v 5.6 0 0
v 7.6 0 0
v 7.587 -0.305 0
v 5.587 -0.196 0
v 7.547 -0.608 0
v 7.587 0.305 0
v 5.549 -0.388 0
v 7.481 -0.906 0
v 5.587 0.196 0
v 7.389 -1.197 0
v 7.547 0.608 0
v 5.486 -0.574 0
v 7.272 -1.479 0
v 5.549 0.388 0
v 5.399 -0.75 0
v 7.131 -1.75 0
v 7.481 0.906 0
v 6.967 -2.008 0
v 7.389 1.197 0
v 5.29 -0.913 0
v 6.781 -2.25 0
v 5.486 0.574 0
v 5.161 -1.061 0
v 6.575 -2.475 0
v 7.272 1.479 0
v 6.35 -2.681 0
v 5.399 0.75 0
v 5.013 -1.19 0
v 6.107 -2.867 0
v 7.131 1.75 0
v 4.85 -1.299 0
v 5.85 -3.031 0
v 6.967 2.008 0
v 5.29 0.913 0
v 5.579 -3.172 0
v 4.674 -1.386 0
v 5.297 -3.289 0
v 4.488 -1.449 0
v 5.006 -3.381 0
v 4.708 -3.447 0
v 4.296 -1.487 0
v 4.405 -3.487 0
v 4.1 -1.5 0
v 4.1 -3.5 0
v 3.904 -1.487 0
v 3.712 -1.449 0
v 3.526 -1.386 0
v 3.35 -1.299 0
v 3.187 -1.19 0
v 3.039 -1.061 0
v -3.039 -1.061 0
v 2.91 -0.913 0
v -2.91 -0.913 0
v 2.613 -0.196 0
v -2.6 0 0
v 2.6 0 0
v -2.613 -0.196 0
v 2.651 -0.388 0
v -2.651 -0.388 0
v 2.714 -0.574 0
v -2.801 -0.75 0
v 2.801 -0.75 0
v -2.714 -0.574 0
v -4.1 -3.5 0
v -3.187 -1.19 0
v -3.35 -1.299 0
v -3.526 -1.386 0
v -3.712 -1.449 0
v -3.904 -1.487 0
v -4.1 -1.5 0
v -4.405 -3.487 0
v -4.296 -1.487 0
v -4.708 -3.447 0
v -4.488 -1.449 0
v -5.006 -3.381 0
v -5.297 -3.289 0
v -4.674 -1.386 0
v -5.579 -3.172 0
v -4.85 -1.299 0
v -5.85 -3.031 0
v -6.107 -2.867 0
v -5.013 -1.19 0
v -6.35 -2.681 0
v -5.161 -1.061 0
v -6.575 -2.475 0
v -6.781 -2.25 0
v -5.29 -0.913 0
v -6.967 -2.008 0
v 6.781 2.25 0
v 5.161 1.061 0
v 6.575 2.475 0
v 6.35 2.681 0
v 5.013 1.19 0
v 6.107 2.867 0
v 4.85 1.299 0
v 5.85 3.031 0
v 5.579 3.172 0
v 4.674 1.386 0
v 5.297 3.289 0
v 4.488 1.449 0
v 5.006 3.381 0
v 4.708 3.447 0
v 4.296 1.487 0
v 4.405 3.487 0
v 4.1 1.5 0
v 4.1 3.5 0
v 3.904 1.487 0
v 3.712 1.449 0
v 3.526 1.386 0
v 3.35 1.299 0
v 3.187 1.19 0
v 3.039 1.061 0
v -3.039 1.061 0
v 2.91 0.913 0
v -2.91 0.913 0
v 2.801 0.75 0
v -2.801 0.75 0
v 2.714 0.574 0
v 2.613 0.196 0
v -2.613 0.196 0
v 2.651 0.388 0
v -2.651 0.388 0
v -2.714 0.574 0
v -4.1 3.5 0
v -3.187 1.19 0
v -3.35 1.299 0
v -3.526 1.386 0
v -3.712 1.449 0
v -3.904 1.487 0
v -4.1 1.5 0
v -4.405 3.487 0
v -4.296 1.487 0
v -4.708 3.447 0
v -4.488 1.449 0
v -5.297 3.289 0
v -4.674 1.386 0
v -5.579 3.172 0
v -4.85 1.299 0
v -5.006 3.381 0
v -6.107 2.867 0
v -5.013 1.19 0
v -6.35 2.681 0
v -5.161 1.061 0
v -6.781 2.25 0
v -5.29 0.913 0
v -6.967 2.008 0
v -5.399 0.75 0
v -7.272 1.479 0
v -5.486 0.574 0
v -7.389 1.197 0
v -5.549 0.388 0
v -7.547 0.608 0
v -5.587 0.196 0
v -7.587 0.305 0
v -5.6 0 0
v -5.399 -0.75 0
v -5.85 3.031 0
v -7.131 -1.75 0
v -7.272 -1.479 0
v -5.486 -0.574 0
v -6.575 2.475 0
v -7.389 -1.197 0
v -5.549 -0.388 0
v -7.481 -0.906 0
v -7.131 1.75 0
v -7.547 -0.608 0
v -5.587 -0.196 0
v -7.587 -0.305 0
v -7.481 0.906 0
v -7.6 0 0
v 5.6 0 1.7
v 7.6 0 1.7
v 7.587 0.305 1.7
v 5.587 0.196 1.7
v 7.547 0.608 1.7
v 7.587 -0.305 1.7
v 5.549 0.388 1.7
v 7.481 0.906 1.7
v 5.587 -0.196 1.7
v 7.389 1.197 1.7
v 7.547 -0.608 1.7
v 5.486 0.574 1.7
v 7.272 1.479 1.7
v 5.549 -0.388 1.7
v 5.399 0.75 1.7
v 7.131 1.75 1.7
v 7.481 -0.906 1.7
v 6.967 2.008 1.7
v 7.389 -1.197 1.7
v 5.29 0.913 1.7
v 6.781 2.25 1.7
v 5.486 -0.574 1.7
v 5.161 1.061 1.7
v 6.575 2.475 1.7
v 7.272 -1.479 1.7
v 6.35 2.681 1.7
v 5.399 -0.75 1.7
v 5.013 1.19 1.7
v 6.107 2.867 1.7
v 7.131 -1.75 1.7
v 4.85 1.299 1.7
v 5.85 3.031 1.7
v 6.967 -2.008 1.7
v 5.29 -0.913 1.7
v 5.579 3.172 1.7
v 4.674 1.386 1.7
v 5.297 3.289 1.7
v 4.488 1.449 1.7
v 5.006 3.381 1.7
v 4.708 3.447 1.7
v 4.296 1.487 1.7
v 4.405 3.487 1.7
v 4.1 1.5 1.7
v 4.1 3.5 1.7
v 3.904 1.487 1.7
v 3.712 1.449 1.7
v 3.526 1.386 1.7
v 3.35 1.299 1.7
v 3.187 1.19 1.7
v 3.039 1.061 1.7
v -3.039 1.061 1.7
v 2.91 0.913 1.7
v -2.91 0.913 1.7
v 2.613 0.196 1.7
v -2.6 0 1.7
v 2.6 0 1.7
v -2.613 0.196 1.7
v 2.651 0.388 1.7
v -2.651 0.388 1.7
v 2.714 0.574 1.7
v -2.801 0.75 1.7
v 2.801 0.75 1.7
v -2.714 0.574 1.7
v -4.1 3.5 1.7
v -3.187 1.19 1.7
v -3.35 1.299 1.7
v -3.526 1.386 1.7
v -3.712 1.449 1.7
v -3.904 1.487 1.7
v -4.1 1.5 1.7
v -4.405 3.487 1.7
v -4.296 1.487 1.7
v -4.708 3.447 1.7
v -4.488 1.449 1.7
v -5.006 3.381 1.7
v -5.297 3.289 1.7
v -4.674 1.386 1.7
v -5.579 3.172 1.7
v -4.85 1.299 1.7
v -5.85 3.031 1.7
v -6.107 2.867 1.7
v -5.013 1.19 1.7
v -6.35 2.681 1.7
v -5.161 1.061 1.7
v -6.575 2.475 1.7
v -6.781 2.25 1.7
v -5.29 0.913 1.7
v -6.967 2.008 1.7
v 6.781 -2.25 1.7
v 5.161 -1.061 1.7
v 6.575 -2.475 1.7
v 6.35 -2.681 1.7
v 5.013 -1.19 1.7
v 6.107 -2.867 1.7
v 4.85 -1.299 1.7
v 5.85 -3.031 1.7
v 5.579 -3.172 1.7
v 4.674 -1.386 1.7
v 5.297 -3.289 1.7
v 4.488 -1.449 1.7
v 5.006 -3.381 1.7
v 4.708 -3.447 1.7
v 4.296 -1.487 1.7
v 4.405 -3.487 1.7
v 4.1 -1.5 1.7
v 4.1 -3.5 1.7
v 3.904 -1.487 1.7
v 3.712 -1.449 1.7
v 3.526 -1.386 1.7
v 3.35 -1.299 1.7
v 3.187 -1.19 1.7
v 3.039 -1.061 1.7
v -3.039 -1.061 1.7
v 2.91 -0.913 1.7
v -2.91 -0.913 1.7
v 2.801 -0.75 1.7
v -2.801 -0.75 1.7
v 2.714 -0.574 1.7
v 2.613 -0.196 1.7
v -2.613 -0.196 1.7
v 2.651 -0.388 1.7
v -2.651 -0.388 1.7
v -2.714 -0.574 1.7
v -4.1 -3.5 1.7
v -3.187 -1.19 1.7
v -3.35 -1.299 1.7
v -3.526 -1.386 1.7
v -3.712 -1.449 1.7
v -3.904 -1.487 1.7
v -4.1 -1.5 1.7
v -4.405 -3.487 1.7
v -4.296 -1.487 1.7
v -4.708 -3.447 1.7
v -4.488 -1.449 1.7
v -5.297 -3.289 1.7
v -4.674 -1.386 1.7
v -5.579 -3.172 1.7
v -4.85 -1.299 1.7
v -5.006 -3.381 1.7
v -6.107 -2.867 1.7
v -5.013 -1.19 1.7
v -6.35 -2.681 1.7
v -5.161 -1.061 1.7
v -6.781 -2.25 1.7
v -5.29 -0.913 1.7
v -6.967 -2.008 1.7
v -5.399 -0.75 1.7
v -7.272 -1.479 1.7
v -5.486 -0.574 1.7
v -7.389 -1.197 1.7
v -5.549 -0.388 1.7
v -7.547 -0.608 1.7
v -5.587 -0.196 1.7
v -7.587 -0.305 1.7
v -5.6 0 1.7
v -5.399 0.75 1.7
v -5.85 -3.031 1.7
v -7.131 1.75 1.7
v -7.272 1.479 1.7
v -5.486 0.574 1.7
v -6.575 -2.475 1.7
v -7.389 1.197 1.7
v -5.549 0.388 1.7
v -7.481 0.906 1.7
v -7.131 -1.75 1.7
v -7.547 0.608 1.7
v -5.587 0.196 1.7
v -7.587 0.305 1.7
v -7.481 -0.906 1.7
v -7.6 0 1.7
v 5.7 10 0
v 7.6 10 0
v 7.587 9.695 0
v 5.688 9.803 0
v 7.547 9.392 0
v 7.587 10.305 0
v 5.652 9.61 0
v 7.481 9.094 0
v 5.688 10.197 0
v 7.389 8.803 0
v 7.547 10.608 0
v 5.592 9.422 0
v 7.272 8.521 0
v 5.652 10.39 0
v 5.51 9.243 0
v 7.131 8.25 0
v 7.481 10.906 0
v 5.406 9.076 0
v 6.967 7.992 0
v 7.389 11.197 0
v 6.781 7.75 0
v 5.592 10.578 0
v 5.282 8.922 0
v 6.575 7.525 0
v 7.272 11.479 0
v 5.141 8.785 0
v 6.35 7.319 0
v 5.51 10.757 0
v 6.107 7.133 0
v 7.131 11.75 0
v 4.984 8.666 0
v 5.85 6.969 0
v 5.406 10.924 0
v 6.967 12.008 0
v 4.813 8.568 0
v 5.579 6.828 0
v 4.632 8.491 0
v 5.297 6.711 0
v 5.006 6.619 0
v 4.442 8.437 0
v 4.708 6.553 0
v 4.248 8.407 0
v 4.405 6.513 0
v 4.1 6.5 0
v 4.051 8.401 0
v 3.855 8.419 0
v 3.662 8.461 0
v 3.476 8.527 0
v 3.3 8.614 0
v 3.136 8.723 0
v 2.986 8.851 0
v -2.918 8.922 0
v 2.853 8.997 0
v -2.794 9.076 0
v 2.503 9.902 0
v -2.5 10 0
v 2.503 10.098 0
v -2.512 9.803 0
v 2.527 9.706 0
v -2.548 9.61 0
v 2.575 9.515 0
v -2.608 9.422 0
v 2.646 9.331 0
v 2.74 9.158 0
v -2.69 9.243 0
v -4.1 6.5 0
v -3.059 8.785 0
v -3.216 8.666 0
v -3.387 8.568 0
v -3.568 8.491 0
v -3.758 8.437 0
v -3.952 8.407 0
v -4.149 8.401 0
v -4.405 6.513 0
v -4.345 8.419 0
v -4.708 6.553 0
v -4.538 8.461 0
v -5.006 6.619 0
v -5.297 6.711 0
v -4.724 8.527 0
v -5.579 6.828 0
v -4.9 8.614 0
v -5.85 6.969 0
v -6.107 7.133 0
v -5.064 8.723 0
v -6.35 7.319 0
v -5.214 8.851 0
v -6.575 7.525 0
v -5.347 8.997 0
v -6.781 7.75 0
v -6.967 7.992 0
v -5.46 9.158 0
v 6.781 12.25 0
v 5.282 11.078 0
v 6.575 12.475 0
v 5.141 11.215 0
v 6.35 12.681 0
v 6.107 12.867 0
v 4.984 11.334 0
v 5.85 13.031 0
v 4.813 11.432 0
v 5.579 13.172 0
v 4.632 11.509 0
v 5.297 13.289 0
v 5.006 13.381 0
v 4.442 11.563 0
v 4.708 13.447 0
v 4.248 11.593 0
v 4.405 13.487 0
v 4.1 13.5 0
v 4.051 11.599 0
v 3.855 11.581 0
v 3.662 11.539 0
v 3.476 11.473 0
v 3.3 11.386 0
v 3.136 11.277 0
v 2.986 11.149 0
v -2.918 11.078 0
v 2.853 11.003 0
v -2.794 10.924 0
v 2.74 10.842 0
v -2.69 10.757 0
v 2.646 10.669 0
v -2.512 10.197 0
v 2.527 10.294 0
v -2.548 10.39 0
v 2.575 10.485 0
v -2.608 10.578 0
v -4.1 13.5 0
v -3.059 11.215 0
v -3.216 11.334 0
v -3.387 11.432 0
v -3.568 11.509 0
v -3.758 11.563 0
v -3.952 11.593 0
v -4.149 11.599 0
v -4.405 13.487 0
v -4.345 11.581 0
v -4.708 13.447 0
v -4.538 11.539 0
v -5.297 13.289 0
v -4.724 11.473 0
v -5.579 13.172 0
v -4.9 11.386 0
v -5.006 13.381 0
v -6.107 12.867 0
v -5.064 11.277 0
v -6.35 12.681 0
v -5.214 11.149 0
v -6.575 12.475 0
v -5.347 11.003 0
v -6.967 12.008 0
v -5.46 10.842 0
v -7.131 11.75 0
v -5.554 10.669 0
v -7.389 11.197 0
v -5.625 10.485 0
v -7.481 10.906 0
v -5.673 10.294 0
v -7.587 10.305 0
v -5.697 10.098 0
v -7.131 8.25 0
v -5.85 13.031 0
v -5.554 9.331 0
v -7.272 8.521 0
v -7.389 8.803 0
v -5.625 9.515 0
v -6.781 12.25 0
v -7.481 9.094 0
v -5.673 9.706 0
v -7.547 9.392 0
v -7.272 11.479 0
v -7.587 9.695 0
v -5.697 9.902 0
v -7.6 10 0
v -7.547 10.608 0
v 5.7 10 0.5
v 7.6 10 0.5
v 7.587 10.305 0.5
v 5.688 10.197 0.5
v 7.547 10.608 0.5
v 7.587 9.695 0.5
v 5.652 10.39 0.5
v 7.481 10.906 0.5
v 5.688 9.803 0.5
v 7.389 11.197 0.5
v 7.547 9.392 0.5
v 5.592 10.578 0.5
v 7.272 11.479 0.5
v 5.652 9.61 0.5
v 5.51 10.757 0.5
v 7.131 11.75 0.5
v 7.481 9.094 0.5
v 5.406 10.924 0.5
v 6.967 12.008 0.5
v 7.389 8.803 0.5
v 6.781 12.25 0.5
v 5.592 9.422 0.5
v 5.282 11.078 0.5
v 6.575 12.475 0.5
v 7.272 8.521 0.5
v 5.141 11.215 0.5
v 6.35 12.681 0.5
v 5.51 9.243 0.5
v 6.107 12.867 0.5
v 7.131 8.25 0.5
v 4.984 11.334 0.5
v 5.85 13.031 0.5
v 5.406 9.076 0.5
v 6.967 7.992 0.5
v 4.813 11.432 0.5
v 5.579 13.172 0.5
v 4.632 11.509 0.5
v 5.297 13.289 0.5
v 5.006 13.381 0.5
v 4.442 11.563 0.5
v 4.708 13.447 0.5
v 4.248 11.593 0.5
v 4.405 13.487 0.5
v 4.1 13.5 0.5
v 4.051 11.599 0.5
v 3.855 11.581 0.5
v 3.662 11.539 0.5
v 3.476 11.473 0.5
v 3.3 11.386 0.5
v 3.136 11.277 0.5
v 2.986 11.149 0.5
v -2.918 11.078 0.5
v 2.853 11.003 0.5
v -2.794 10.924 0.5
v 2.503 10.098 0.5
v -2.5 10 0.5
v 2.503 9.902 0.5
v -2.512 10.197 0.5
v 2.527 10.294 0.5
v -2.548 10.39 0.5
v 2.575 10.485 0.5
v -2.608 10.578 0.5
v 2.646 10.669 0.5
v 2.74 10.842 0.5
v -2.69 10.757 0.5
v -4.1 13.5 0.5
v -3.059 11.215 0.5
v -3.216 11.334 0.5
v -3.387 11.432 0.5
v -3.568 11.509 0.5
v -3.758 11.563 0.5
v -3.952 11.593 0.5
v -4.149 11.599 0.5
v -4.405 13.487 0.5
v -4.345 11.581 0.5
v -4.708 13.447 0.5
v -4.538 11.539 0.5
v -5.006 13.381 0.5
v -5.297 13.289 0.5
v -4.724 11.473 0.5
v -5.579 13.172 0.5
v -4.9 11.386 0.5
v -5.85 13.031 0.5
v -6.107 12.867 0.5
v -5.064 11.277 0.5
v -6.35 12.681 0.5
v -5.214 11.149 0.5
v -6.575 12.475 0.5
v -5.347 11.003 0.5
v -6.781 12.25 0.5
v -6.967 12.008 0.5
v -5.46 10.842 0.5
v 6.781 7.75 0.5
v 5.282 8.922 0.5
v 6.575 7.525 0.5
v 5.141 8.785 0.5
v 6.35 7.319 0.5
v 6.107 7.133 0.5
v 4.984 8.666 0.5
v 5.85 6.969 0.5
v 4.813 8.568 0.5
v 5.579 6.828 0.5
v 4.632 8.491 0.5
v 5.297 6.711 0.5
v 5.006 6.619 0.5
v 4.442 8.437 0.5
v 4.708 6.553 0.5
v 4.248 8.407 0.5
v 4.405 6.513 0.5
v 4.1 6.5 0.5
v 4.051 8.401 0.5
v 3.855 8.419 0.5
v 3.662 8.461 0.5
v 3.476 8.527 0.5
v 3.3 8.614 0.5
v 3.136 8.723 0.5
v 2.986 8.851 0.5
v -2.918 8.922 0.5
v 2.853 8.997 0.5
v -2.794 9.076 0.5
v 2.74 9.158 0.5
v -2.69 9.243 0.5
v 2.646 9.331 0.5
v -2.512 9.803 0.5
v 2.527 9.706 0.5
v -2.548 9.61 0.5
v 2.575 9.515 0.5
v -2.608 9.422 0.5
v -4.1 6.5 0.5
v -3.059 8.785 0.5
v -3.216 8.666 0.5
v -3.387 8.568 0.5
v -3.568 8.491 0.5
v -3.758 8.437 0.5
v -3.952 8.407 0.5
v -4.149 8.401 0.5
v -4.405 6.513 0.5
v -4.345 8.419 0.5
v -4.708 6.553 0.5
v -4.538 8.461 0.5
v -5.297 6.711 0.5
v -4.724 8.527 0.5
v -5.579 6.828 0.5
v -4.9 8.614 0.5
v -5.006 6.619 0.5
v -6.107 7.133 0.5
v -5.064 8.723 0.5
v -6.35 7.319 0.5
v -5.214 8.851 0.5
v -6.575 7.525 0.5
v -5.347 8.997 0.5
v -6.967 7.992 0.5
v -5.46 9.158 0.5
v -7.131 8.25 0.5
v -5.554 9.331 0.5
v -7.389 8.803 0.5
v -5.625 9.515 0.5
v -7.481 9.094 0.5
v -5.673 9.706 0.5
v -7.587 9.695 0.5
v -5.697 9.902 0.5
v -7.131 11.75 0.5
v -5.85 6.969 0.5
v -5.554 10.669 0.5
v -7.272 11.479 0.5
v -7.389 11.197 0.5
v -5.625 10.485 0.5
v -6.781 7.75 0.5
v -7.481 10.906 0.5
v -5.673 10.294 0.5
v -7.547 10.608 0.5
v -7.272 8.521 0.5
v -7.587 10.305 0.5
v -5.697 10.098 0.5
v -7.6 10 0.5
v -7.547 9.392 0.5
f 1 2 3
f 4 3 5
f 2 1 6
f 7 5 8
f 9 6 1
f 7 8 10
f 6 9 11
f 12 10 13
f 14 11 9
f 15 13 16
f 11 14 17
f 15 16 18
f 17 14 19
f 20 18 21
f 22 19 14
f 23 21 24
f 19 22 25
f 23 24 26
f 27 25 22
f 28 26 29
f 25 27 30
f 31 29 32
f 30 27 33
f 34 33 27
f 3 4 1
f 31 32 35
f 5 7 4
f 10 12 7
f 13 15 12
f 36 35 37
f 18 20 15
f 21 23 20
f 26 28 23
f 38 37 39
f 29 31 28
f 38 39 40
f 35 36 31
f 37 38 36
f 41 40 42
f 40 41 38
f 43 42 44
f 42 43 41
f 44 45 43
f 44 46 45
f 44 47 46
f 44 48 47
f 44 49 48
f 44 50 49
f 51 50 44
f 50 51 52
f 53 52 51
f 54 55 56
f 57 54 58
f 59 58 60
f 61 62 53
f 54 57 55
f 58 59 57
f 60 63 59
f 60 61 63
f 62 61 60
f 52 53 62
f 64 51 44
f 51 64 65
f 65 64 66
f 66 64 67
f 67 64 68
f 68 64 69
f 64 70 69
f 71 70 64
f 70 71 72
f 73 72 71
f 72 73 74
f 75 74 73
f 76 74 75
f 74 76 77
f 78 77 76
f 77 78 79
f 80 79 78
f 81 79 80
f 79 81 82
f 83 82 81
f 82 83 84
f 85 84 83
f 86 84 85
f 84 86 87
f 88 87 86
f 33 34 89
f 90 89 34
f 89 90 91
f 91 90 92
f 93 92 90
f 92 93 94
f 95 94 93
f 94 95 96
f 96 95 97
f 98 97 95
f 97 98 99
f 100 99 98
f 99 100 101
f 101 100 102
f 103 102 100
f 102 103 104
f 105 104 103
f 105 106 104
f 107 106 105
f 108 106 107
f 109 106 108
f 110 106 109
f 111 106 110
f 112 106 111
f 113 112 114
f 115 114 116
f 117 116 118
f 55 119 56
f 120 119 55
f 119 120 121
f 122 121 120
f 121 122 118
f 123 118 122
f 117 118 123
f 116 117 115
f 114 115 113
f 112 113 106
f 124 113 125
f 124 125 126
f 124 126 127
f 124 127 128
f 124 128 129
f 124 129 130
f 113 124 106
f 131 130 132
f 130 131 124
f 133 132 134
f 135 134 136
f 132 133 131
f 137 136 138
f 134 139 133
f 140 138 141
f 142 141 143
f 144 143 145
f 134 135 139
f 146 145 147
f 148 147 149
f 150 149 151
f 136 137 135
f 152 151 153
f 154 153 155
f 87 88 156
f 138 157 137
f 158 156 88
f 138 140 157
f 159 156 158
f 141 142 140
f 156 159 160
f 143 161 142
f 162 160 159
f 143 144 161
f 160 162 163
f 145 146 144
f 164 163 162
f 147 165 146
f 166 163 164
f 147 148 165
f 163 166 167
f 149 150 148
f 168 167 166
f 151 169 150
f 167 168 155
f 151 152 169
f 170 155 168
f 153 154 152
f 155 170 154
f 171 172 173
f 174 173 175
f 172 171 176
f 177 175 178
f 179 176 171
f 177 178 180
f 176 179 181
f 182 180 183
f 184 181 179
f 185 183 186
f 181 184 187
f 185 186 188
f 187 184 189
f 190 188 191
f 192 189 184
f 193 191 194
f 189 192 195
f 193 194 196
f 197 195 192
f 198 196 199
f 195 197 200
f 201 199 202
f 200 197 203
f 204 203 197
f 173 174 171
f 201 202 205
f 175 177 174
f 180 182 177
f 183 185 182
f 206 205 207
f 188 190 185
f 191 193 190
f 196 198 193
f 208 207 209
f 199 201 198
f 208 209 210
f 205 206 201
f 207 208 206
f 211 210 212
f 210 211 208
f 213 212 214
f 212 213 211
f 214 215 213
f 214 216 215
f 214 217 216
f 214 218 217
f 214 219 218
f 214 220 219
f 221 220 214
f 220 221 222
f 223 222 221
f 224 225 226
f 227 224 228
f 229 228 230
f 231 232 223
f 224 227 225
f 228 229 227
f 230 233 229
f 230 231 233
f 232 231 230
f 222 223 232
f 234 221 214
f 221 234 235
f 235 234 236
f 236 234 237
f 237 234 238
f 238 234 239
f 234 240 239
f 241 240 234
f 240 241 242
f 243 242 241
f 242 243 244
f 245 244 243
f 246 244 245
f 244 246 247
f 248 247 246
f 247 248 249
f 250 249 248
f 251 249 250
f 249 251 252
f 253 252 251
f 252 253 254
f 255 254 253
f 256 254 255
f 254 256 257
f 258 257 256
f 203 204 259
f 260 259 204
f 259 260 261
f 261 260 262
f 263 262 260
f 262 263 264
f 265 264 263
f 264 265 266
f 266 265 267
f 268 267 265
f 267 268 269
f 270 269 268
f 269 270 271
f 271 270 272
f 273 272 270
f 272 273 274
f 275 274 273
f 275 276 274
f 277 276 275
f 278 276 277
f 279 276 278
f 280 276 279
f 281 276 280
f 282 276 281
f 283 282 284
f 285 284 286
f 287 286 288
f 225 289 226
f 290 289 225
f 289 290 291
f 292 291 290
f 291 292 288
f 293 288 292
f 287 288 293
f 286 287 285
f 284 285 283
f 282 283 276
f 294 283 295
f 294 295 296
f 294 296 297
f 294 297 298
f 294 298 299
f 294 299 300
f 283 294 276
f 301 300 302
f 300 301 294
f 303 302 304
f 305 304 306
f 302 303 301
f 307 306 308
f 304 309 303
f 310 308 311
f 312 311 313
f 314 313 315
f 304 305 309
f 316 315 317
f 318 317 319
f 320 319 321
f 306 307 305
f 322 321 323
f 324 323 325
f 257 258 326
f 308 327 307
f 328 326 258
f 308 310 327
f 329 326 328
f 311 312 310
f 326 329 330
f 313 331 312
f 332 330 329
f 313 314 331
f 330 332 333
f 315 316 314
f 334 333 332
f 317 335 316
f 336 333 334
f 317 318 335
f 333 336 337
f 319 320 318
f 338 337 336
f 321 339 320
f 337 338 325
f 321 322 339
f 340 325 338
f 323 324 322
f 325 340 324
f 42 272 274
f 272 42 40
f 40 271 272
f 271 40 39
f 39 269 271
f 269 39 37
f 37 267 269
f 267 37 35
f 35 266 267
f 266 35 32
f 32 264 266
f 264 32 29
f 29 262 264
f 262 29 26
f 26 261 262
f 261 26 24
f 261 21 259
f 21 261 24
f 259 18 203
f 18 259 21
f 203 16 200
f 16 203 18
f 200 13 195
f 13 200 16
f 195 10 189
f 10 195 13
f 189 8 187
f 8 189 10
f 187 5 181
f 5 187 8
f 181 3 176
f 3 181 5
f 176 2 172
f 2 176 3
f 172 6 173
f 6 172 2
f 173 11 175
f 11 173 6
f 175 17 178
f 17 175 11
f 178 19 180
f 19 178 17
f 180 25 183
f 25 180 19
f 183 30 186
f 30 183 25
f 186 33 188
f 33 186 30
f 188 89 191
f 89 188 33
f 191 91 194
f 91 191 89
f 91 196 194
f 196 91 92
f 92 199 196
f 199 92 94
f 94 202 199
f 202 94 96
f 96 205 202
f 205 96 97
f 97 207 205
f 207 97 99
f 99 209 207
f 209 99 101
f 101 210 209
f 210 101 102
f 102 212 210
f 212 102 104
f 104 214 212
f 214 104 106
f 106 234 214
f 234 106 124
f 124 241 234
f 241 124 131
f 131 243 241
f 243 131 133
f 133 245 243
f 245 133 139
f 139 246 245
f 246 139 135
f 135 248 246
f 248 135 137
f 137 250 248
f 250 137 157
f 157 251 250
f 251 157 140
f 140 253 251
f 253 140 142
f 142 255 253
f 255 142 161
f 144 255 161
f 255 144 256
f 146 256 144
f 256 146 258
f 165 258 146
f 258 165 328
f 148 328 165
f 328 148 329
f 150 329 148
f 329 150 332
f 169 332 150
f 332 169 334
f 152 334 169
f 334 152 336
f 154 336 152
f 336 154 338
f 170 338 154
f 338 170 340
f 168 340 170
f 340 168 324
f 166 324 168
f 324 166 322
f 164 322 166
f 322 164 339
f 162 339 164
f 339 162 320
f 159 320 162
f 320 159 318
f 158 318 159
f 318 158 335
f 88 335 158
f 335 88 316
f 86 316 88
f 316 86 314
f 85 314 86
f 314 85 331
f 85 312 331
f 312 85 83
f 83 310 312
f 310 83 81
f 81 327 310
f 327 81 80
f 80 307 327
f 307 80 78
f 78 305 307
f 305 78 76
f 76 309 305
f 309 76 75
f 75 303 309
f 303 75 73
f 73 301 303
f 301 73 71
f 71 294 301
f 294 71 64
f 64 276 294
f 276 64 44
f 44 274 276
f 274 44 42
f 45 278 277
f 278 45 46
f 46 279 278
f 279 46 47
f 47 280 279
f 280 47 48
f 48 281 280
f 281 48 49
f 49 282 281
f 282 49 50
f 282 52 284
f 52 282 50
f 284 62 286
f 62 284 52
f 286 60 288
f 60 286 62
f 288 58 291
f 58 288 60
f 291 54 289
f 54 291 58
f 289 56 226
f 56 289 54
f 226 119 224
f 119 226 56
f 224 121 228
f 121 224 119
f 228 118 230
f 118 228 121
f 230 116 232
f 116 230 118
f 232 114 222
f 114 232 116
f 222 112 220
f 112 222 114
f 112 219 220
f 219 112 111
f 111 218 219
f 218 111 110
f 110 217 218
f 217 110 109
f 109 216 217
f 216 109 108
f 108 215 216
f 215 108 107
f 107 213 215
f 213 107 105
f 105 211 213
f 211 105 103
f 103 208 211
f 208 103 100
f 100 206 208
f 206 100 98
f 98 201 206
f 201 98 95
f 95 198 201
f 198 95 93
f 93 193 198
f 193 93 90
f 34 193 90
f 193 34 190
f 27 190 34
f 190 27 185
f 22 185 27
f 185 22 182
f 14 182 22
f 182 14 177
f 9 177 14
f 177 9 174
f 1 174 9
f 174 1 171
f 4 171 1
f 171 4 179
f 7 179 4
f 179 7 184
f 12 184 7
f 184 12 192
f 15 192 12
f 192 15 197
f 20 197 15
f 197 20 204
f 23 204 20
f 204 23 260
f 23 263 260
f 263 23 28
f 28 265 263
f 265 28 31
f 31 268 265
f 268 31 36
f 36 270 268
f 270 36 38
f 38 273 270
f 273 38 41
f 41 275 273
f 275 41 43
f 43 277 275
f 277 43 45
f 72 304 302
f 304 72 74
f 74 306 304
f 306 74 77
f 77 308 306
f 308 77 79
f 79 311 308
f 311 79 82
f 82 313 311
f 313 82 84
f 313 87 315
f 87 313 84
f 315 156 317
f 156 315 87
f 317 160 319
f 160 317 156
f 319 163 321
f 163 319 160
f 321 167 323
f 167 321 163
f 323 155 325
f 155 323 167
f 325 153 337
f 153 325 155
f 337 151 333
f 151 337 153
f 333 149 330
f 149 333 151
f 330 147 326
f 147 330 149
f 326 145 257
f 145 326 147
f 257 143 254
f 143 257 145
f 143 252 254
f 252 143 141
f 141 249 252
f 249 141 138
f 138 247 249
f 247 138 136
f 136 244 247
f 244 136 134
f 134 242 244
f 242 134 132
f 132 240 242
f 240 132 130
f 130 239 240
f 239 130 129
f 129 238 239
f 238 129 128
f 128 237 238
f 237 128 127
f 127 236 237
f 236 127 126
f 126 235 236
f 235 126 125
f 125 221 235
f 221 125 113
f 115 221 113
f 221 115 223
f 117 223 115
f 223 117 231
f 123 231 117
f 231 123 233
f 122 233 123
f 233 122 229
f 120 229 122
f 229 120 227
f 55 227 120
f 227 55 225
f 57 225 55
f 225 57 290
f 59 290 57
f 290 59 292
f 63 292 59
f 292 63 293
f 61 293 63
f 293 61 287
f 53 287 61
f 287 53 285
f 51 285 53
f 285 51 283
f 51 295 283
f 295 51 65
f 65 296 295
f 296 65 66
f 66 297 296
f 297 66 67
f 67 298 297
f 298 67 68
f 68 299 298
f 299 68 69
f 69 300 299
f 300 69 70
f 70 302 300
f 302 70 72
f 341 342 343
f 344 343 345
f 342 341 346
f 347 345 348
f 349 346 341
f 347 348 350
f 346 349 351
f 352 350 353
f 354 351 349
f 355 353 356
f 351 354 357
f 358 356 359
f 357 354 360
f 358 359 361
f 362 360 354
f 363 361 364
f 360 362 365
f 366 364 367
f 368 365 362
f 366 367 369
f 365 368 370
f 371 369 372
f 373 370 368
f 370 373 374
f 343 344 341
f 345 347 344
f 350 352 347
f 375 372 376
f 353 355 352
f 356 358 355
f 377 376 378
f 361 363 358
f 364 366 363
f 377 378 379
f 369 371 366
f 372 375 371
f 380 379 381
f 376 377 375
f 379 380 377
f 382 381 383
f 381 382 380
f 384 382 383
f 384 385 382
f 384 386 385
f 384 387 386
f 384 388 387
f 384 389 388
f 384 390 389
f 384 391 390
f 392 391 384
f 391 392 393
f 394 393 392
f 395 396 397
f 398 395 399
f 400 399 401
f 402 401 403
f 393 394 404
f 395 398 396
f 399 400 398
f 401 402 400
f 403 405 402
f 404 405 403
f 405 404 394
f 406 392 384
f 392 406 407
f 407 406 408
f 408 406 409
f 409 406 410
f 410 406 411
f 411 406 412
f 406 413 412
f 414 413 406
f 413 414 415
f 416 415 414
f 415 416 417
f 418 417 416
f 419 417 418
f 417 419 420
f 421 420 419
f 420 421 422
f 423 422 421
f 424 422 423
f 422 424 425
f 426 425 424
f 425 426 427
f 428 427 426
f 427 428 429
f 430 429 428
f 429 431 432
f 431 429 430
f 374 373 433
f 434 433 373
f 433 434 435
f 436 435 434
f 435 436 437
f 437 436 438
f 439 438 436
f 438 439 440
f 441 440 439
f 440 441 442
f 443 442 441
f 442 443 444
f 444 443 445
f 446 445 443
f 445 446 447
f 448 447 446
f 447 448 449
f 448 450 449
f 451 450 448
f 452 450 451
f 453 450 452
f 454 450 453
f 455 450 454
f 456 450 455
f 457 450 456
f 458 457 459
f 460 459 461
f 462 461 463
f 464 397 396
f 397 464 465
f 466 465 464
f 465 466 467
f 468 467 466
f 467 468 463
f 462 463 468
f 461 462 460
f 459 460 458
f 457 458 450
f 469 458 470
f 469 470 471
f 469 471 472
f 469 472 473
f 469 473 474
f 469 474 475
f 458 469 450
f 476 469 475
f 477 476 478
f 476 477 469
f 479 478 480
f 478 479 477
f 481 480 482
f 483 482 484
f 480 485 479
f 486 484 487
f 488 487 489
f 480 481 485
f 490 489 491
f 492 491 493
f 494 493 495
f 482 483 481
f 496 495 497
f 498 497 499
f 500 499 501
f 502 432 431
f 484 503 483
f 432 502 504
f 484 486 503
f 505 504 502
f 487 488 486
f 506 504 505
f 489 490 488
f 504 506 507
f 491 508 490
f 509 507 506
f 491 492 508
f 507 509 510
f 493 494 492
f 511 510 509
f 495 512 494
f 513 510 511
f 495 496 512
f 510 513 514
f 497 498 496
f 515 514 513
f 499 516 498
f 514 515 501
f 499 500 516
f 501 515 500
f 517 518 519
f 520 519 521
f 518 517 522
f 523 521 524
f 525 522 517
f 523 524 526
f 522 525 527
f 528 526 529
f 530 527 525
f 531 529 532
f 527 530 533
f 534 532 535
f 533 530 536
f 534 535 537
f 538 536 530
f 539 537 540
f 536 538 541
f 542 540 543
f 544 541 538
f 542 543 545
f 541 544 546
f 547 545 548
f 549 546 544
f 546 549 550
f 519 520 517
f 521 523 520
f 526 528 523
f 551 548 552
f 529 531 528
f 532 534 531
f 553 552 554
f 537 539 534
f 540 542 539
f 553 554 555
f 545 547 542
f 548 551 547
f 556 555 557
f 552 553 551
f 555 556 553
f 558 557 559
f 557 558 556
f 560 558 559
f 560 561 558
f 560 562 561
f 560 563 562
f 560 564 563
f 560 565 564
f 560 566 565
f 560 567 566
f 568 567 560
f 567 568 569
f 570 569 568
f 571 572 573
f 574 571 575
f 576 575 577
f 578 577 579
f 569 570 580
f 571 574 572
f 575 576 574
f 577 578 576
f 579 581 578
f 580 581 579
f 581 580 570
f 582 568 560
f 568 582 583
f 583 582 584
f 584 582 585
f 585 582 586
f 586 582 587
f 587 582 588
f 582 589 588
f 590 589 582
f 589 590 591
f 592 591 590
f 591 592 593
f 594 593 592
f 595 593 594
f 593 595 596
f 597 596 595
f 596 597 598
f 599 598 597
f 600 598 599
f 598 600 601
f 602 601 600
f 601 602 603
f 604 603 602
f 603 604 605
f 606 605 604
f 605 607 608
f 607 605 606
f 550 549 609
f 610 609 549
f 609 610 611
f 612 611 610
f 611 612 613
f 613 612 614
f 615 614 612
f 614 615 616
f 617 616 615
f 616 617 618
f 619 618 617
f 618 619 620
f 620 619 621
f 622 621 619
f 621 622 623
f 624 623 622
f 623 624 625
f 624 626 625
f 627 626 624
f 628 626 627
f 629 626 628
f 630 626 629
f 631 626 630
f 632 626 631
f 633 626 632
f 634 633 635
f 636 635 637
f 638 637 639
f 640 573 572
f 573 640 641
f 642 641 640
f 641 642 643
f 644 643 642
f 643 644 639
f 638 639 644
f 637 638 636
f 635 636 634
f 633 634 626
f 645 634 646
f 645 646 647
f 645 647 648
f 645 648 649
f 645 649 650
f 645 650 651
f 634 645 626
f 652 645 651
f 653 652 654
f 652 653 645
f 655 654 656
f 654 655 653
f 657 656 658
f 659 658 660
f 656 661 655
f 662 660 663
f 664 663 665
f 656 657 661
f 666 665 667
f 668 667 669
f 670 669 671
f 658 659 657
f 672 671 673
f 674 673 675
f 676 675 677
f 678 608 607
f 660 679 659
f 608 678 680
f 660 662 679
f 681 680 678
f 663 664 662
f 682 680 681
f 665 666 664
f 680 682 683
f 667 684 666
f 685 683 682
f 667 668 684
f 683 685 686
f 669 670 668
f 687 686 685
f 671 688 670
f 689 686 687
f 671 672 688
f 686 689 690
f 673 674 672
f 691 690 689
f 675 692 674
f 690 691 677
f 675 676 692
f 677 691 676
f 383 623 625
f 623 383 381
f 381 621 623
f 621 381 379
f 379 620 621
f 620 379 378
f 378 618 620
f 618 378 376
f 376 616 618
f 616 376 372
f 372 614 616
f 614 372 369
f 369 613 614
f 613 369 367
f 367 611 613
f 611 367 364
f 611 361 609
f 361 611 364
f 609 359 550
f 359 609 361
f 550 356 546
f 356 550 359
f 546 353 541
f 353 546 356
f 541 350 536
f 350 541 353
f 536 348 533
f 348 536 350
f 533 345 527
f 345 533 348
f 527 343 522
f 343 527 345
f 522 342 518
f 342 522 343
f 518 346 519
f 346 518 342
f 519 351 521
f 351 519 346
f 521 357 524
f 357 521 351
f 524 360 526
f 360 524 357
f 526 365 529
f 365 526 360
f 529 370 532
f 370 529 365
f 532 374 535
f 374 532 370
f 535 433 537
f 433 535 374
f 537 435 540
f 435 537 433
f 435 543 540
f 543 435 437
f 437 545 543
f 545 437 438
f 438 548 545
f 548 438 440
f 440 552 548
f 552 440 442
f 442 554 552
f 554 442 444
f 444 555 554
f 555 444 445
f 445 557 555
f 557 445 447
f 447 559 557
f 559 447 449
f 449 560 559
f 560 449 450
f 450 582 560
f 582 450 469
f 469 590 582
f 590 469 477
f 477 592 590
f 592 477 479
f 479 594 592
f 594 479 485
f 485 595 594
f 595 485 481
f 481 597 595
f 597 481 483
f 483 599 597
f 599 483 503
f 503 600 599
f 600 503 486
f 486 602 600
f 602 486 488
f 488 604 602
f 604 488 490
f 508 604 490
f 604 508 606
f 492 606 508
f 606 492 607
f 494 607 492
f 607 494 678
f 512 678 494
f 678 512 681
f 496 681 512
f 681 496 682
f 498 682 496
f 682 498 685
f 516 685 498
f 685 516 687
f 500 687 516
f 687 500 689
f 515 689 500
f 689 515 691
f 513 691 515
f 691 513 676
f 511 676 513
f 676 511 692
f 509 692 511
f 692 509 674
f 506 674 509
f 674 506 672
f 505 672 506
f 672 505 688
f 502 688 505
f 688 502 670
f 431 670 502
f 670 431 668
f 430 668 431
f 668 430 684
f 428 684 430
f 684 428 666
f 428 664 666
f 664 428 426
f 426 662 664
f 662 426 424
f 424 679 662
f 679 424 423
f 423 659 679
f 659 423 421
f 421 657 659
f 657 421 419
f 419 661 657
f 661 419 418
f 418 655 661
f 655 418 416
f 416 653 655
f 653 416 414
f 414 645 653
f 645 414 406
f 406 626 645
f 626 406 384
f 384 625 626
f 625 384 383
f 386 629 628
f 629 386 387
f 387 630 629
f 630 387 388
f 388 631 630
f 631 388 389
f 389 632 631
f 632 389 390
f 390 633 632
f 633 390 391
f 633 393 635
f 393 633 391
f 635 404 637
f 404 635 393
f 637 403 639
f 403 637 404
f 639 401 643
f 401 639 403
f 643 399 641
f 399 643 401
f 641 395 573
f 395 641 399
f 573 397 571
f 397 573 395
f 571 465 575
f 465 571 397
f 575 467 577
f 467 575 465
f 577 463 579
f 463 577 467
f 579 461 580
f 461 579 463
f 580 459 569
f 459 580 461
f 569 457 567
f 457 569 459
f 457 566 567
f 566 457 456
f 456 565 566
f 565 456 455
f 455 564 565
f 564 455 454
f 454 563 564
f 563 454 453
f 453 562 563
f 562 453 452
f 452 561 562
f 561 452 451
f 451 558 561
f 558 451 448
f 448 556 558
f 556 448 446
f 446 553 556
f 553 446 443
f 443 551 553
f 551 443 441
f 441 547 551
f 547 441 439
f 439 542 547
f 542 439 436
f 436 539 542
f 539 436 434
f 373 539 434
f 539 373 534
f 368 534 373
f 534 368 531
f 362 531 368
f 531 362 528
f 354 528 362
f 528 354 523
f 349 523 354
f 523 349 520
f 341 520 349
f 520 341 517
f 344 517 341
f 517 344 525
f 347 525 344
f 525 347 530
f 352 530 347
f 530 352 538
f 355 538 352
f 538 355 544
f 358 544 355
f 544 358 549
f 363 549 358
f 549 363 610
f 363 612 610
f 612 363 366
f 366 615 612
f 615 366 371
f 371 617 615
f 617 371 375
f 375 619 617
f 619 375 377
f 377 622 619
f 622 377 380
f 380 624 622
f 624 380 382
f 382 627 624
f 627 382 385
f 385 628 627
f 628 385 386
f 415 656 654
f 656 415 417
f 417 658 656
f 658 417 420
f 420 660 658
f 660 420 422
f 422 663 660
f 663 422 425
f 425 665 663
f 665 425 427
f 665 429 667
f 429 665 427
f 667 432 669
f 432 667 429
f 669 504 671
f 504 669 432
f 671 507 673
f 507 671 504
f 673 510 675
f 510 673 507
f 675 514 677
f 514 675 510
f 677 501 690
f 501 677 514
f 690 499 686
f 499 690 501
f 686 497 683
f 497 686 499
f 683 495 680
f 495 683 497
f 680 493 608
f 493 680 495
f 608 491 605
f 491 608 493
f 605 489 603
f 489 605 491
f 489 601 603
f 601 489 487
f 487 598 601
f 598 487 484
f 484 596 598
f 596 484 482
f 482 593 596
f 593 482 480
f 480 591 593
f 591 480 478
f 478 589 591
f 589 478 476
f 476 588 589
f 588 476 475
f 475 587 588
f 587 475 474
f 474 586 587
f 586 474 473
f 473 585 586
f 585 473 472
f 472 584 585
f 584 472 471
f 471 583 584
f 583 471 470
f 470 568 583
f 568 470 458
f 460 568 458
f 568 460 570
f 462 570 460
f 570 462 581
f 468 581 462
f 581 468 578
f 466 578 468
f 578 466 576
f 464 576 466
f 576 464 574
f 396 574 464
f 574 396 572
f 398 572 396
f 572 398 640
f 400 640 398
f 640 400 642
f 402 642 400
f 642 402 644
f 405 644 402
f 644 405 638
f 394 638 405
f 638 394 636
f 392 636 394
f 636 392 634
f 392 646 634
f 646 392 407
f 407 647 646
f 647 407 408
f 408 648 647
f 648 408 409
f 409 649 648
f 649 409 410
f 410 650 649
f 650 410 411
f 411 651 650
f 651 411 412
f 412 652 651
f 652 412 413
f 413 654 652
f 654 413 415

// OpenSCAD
$fa=5;$fs=.2;

t=1.8;
l=4;
d=8.2;
r=7/2;

module j(hole_d){
	difference(){
		minkowski(){circle(r=r);square([d,1e-9],center=true);}
		translate([ d/2,0])circle(d=hole_d);
		translate([-d/2,0])circle(d=hole_d);
	}
}

linear_extrude(l-t-.5)j(3);
linear_extrude(.5)translate([0,10])j(3.2);
